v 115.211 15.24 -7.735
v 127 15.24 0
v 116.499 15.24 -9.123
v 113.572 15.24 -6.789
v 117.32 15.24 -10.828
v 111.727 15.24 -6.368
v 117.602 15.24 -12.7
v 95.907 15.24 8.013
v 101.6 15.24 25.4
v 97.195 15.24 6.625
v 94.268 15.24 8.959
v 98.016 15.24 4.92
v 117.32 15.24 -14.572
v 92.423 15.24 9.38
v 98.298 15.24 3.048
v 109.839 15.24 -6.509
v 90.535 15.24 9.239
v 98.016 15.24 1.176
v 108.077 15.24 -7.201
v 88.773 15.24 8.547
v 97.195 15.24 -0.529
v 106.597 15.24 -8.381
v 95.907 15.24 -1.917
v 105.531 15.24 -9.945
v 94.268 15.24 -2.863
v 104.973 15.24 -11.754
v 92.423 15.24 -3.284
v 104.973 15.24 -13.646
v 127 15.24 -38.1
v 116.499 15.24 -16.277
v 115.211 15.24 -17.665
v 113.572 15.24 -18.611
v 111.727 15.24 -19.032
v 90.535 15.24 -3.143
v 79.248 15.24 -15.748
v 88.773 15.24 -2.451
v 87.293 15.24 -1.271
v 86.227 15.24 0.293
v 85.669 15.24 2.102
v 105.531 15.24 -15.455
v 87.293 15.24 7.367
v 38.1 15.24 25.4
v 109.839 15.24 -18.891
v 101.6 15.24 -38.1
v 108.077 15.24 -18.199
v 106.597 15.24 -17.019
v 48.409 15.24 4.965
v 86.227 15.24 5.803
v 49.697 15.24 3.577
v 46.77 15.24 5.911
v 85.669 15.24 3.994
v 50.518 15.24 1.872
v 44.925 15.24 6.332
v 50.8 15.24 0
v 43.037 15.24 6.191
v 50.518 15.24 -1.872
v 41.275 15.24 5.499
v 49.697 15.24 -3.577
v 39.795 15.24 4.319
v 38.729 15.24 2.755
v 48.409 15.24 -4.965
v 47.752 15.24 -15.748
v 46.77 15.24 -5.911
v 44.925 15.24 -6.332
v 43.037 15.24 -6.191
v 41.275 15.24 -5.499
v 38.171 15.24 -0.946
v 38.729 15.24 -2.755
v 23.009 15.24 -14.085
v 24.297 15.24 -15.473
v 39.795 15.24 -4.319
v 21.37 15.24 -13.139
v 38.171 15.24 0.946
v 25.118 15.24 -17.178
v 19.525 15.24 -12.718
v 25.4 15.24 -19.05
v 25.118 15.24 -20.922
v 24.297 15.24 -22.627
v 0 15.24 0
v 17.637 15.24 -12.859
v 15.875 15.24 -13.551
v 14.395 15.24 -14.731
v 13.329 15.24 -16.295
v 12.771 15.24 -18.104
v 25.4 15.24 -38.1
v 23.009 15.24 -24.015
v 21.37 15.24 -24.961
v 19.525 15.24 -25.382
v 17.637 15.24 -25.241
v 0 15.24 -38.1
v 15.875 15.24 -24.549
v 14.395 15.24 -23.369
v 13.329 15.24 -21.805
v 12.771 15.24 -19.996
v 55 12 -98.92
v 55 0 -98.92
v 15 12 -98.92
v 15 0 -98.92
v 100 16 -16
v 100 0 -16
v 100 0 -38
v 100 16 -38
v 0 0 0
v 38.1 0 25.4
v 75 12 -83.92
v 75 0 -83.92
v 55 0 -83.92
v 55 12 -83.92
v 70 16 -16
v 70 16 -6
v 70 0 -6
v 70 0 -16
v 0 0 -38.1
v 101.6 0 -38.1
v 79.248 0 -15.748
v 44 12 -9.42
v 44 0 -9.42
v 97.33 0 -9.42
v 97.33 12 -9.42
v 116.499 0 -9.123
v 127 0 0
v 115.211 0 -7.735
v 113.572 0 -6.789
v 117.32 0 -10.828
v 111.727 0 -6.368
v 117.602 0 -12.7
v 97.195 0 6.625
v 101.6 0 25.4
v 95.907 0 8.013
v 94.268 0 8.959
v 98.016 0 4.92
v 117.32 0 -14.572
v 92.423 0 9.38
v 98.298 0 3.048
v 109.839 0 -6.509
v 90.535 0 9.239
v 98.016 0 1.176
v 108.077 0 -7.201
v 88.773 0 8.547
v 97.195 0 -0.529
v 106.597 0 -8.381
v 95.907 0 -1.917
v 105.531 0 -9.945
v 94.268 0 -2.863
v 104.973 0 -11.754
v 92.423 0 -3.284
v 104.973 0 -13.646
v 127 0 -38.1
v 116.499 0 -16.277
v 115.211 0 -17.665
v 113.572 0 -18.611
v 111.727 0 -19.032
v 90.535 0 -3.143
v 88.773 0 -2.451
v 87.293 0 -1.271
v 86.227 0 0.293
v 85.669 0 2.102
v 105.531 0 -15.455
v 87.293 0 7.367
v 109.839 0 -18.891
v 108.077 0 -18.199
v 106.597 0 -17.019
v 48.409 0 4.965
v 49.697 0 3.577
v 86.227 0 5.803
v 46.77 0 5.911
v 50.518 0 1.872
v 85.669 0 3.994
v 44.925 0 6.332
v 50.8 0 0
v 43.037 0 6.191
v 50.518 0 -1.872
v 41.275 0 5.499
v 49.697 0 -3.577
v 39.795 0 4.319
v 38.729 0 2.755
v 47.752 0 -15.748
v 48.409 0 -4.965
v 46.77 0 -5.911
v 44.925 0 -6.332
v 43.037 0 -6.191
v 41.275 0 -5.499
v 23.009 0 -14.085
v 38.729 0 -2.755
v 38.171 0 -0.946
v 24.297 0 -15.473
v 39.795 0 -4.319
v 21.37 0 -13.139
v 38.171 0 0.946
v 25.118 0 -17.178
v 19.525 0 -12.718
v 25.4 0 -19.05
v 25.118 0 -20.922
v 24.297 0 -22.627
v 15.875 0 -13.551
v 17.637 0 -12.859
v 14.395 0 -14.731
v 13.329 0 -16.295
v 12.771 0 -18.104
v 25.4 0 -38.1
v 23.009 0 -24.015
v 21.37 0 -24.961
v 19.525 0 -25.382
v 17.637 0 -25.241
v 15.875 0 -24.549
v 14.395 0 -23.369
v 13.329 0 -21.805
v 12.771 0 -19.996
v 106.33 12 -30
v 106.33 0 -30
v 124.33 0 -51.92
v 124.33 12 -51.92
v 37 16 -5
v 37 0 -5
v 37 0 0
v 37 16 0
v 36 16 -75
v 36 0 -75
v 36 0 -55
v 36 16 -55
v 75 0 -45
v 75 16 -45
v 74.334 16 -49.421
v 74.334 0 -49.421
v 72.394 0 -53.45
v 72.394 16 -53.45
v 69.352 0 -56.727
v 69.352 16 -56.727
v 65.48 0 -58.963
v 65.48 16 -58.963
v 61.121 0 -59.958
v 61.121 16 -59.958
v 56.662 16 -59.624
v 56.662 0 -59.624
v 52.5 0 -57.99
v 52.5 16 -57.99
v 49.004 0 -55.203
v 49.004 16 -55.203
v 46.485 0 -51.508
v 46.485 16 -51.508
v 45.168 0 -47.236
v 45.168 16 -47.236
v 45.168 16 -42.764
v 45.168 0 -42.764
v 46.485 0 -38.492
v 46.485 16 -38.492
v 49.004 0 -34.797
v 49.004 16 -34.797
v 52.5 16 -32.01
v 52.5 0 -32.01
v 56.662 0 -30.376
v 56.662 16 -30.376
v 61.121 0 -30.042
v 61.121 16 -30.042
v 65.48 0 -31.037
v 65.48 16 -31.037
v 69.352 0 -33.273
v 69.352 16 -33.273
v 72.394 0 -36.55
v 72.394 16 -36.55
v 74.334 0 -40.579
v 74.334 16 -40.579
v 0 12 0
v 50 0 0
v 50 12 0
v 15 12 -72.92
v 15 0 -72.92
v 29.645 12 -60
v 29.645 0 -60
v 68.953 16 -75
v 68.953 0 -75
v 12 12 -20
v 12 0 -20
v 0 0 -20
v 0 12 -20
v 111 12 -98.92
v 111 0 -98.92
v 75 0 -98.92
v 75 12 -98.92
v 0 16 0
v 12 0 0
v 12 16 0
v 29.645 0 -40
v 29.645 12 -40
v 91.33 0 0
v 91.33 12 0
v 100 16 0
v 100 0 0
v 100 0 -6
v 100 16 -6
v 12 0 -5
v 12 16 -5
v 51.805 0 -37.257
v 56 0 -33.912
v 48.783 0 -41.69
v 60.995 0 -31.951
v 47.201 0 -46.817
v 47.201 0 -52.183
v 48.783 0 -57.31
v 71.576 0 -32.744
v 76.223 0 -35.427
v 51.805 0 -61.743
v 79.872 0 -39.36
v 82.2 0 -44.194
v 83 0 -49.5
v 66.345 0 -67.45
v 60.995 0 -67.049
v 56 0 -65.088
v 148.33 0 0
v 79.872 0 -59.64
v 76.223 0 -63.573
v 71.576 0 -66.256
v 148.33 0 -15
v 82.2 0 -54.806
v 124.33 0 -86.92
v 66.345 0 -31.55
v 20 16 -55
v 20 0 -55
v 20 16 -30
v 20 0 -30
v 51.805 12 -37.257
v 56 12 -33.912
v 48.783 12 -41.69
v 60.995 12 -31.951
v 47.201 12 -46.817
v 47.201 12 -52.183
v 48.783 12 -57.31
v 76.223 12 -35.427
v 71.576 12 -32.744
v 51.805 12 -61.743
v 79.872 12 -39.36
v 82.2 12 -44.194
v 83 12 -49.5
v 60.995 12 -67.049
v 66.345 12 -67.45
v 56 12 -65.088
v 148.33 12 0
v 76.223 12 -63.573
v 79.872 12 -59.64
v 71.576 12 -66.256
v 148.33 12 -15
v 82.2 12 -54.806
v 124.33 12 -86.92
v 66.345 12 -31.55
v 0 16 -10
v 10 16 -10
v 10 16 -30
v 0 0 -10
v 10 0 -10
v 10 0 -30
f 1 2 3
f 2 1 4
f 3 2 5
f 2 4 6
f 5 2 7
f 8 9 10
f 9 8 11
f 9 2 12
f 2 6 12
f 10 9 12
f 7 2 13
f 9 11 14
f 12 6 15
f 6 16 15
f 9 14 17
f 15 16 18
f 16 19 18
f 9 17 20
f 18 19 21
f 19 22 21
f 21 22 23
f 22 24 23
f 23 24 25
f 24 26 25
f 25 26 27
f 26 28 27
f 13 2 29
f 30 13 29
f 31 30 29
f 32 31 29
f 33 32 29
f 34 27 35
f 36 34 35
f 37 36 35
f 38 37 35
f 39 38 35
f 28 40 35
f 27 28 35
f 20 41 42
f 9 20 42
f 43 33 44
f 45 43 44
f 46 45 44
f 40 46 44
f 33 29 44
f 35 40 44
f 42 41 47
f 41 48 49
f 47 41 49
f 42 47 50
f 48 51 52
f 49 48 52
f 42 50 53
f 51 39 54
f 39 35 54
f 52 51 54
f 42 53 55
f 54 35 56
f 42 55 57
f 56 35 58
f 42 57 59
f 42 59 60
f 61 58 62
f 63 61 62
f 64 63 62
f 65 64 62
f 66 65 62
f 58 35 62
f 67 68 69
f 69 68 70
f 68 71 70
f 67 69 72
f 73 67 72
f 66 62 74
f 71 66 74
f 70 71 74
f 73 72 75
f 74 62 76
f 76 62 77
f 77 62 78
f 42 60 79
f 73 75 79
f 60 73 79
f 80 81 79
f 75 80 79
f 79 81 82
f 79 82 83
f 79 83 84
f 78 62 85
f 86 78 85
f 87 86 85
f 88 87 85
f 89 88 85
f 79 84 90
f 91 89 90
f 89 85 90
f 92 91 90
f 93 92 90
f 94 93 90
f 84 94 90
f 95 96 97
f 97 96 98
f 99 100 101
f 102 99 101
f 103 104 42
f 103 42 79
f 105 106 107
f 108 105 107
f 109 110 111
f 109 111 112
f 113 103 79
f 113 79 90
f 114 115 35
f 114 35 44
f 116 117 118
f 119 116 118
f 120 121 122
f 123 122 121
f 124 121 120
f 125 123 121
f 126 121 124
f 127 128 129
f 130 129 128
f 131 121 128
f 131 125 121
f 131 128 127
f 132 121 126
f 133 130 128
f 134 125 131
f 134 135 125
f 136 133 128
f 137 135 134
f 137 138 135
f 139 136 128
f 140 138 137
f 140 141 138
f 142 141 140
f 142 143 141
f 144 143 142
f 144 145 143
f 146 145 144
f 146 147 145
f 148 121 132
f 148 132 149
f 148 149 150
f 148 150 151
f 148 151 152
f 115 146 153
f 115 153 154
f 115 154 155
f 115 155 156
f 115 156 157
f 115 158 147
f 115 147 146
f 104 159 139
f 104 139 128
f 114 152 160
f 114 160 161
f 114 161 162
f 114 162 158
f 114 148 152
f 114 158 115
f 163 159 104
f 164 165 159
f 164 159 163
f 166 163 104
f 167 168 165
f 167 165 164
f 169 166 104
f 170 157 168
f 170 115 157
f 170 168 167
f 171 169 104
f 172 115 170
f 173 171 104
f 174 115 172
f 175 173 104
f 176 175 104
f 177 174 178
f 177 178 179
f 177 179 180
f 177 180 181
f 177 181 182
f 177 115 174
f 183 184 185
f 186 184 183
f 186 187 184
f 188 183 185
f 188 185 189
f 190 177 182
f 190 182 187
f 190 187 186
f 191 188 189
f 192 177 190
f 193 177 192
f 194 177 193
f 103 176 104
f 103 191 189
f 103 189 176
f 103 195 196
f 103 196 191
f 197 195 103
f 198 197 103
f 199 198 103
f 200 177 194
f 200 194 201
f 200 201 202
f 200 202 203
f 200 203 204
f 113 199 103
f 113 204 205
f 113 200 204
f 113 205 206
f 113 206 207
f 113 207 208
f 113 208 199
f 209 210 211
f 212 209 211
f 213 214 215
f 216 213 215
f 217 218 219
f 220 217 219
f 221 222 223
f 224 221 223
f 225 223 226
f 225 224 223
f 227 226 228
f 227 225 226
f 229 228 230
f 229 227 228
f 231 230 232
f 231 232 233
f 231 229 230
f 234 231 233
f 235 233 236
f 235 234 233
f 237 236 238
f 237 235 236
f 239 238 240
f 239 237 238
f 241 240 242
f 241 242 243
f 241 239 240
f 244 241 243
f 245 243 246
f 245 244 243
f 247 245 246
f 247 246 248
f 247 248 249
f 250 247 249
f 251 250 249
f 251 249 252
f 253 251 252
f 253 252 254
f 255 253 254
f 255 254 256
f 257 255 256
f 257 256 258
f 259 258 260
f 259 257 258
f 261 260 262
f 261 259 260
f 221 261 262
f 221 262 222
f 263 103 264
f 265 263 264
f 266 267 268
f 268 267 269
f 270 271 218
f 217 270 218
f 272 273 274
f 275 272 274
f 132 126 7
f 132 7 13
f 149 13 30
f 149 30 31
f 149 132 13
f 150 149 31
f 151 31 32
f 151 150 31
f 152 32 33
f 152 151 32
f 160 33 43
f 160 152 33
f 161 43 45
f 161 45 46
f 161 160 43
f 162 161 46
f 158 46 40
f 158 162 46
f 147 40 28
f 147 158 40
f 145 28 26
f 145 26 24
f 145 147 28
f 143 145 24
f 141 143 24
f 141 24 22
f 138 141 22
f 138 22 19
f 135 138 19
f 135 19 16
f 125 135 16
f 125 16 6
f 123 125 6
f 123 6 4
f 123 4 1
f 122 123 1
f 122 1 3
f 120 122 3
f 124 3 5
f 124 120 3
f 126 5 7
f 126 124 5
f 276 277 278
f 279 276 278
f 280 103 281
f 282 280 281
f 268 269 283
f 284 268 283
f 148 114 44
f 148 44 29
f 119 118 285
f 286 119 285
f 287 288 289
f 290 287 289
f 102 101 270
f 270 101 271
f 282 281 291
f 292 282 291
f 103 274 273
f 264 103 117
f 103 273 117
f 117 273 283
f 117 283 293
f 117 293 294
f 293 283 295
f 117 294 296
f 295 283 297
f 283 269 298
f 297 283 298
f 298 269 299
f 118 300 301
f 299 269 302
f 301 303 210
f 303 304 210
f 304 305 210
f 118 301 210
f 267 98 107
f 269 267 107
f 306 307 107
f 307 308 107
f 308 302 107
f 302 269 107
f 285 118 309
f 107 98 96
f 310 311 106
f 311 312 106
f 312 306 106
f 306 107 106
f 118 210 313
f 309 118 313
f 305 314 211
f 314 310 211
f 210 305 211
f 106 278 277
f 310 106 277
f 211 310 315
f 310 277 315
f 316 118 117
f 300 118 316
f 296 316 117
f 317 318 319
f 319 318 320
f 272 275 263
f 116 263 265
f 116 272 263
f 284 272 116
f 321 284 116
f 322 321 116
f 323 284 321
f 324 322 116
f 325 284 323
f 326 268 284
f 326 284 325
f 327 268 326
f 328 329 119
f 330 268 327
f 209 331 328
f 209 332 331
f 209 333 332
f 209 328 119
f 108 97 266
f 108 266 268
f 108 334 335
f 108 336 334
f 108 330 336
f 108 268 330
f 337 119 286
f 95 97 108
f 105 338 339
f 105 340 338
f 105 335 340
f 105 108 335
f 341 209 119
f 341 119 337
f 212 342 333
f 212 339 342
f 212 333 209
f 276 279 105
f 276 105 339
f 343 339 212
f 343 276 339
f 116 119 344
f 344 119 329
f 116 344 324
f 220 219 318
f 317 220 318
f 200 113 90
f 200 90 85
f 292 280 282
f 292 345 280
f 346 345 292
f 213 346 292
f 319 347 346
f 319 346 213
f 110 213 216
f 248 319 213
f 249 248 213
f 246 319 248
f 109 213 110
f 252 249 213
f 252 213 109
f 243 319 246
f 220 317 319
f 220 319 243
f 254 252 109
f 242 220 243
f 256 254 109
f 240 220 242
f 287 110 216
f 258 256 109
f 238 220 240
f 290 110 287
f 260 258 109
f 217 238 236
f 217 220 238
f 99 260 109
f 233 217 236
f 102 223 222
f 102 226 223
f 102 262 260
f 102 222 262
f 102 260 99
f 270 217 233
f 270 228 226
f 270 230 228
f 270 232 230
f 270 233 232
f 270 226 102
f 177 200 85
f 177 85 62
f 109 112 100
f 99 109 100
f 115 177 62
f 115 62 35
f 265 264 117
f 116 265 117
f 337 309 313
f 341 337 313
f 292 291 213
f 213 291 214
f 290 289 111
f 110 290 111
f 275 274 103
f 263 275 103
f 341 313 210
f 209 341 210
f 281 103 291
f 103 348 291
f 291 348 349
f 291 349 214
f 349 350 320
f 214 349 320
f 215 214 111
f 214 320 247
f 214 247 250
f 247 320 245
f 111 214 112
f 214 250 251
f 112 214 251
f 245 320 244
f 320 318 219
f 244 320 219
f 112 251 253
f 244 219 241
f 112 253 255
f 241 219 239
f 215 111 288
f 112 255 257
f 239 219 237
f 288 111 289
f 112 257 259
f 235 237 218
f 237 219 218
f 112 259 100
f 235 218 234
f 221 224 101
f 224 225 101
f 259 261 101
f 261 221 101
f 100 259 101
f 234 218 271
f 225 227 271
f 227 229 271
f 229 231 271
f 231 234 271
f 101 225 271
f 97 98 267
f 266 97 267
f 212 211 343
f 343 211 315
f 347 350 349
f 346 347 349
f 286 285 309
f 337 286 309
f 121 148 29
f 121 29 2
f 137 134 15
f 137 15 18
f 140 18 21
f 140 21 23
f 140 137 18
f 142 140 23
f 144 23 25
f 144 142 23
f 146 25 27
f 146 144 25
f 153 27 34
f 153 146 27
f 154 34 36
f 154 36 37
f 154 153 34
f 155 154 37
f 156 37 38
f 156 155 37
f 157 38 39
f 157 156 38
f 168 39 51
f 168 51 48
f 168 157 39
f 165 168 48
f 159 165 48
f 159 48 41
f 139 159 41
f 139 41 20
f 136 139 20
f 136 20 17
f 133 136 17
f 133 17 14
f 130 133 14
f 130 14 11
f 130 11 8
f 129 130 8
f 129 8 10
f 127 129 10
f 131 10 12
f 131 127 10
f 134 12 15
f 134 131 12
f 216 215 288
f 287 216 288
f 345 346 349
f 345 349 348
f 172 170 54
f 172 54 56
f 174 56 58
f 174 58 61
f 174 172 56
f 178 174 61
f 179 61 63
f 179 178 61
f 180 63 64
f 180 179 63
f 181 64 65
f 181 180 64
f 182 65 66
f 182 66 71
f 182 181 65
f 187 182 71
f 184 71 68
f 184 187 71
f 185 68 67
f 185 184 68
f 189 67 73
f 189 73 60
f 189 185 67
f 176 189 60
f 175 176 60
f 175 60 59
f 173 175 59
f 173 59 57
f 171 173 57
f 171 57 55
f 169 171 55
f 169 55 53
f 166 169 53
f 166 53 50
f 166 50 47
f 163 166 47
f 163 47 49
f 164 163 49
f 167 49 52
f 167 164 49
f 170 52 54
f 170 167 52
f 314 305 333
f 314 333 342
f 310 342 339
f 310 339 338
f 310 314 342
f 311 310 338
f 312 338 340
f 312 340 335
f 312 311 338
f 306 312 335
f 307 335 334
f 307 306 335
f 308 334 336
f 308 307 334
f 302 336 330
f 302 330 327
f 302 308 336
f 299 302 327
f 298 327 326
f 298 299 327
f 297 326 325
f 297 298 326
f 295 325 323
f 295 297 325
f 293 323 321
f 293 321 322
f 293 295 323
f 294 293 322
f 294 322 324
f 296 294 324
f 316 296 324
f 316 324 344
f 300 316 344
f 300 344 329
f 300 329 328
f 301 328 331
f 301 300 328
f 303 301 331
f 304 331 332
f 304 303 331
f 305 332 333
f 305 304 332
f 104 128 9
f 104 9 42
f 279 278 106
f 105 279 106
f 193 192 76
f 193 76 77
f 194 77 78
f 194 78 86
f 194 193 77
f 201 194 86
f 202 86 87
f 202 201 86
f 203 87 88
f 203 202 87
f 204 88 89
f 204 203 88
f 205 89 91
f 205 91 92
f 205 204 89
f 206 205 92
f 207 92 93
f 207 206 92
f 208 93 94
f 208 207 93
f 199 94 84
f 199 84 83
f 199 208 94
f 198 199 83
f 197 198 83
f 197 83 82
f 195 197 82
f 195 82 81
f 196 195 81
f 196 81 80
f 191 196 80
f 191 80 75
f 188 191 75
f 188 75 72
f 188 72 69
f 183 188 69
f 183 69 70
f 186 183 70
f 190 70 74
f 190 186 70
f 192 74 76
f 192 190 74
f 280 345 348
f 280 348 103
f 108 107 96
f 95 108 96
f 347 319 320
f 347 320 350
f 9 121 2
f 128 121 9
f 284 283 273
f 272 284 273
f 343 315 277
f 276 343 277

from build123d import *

# Parameters (mm, degrees)
SKETCH1_R           = 18
BOSS_EXTRUDE1_DEPTH = 12
SKETCH3_R           = 6.35
BOSS_EXTRUDE2_DEPTH = 15.24
SKETCH5_R           = 15
BOSS_EXTRUDE3_DEPTH = 16


with BuildPart() as part:
    # Sketch1 → Boss-Extrude1 (new body)
    with BuildSketch(Plane(origin=(0, 0, 0), x_dir=(1, 0, 0), z_dir=(0, 1, 0))):
        Polygon((0, 0), (50, 0), (44, 9.42), (97.33, 9.42), (91.33, 0), (148.33, 0), (148.33, 15), (106.33, 30), (124.33, 51.92), (124.33, 86.92), (111, 98.92), (75, 98.92), (75, 83.92), (55, 83.92), (55, 98.92), (15, 98.92), (15, 72.92), (29.644658559, 60), (29.644658559, 40), (12, 20), (0, 20), align=None)
        with Locations((65, 49.5)):
            Circle(SKETCH1_R, mode=Mode.SUBTRACT)
    extrude(amount=BOSS_EXTRUDE1_DEPTH)


with BuildPart() as body_2:
    # Sketch3 → Boss-Extrude2 (new body)
    with BuildSketch(Plane(origin=(0, 0, 0), x_dir=(1, 0, 0), z_dir=(0, 1, 0))):
        Polygon((0, 0), (0, 38.1), (25.4, 38.1), (47.752, 15.748), (79.248, 15.748), (101.6, 38.1), (127, 38.1), (127, 0), (101.6, -25.4), (38.1, -25.4), align=None)
        with Locations((19.05, 19.05)):
            Circle(SKETCH3_R, mode=Mode.SUBTRACT)
        with Locations((44.45, 0)):
            Circle(SKETCH3_R, mode=Mode.SUBTRACT)
        with Locations((91.948, -3.048)):
            Circle(SKETCH3_R, mode=Mode.SUBTRACT)
        with Locations((111.252, 12.7)):
            Circle(SKETCH3_R, mode=Mode.SUBTRACT)
    extrude(amount=BOSS_EXTRUDE2_DEPTH)


with BuildPart() as body_3:
    # Sketch5 → Boss-Extrude3 (new body)
    with BuildSketch(Plane(origin=(0, 0, 0), x_dir=(1, 0, 0), z_dir=(0, 1, 0))):
        Polygon((0, 0), (12, 0), (12, 5), (37, 5), (37, 0), (100, 0), (100, 6), (70, 6), (70, 16), (100, 16), (100, 38), (68.953313646, 75), (36, 75), (36, 55), (20, 55), (20, 30), (10, 30), (10, 10), (0, 10), align=None)
        with Locations((60, 45)):
            Circle(SKETCH5_R, mode=Mode.SUBTRACT)
    extrude(amount=BOSS_EXTRUDE3_DEPTH)


solid = Compound([part.part, body_2.part, body_3.part])
